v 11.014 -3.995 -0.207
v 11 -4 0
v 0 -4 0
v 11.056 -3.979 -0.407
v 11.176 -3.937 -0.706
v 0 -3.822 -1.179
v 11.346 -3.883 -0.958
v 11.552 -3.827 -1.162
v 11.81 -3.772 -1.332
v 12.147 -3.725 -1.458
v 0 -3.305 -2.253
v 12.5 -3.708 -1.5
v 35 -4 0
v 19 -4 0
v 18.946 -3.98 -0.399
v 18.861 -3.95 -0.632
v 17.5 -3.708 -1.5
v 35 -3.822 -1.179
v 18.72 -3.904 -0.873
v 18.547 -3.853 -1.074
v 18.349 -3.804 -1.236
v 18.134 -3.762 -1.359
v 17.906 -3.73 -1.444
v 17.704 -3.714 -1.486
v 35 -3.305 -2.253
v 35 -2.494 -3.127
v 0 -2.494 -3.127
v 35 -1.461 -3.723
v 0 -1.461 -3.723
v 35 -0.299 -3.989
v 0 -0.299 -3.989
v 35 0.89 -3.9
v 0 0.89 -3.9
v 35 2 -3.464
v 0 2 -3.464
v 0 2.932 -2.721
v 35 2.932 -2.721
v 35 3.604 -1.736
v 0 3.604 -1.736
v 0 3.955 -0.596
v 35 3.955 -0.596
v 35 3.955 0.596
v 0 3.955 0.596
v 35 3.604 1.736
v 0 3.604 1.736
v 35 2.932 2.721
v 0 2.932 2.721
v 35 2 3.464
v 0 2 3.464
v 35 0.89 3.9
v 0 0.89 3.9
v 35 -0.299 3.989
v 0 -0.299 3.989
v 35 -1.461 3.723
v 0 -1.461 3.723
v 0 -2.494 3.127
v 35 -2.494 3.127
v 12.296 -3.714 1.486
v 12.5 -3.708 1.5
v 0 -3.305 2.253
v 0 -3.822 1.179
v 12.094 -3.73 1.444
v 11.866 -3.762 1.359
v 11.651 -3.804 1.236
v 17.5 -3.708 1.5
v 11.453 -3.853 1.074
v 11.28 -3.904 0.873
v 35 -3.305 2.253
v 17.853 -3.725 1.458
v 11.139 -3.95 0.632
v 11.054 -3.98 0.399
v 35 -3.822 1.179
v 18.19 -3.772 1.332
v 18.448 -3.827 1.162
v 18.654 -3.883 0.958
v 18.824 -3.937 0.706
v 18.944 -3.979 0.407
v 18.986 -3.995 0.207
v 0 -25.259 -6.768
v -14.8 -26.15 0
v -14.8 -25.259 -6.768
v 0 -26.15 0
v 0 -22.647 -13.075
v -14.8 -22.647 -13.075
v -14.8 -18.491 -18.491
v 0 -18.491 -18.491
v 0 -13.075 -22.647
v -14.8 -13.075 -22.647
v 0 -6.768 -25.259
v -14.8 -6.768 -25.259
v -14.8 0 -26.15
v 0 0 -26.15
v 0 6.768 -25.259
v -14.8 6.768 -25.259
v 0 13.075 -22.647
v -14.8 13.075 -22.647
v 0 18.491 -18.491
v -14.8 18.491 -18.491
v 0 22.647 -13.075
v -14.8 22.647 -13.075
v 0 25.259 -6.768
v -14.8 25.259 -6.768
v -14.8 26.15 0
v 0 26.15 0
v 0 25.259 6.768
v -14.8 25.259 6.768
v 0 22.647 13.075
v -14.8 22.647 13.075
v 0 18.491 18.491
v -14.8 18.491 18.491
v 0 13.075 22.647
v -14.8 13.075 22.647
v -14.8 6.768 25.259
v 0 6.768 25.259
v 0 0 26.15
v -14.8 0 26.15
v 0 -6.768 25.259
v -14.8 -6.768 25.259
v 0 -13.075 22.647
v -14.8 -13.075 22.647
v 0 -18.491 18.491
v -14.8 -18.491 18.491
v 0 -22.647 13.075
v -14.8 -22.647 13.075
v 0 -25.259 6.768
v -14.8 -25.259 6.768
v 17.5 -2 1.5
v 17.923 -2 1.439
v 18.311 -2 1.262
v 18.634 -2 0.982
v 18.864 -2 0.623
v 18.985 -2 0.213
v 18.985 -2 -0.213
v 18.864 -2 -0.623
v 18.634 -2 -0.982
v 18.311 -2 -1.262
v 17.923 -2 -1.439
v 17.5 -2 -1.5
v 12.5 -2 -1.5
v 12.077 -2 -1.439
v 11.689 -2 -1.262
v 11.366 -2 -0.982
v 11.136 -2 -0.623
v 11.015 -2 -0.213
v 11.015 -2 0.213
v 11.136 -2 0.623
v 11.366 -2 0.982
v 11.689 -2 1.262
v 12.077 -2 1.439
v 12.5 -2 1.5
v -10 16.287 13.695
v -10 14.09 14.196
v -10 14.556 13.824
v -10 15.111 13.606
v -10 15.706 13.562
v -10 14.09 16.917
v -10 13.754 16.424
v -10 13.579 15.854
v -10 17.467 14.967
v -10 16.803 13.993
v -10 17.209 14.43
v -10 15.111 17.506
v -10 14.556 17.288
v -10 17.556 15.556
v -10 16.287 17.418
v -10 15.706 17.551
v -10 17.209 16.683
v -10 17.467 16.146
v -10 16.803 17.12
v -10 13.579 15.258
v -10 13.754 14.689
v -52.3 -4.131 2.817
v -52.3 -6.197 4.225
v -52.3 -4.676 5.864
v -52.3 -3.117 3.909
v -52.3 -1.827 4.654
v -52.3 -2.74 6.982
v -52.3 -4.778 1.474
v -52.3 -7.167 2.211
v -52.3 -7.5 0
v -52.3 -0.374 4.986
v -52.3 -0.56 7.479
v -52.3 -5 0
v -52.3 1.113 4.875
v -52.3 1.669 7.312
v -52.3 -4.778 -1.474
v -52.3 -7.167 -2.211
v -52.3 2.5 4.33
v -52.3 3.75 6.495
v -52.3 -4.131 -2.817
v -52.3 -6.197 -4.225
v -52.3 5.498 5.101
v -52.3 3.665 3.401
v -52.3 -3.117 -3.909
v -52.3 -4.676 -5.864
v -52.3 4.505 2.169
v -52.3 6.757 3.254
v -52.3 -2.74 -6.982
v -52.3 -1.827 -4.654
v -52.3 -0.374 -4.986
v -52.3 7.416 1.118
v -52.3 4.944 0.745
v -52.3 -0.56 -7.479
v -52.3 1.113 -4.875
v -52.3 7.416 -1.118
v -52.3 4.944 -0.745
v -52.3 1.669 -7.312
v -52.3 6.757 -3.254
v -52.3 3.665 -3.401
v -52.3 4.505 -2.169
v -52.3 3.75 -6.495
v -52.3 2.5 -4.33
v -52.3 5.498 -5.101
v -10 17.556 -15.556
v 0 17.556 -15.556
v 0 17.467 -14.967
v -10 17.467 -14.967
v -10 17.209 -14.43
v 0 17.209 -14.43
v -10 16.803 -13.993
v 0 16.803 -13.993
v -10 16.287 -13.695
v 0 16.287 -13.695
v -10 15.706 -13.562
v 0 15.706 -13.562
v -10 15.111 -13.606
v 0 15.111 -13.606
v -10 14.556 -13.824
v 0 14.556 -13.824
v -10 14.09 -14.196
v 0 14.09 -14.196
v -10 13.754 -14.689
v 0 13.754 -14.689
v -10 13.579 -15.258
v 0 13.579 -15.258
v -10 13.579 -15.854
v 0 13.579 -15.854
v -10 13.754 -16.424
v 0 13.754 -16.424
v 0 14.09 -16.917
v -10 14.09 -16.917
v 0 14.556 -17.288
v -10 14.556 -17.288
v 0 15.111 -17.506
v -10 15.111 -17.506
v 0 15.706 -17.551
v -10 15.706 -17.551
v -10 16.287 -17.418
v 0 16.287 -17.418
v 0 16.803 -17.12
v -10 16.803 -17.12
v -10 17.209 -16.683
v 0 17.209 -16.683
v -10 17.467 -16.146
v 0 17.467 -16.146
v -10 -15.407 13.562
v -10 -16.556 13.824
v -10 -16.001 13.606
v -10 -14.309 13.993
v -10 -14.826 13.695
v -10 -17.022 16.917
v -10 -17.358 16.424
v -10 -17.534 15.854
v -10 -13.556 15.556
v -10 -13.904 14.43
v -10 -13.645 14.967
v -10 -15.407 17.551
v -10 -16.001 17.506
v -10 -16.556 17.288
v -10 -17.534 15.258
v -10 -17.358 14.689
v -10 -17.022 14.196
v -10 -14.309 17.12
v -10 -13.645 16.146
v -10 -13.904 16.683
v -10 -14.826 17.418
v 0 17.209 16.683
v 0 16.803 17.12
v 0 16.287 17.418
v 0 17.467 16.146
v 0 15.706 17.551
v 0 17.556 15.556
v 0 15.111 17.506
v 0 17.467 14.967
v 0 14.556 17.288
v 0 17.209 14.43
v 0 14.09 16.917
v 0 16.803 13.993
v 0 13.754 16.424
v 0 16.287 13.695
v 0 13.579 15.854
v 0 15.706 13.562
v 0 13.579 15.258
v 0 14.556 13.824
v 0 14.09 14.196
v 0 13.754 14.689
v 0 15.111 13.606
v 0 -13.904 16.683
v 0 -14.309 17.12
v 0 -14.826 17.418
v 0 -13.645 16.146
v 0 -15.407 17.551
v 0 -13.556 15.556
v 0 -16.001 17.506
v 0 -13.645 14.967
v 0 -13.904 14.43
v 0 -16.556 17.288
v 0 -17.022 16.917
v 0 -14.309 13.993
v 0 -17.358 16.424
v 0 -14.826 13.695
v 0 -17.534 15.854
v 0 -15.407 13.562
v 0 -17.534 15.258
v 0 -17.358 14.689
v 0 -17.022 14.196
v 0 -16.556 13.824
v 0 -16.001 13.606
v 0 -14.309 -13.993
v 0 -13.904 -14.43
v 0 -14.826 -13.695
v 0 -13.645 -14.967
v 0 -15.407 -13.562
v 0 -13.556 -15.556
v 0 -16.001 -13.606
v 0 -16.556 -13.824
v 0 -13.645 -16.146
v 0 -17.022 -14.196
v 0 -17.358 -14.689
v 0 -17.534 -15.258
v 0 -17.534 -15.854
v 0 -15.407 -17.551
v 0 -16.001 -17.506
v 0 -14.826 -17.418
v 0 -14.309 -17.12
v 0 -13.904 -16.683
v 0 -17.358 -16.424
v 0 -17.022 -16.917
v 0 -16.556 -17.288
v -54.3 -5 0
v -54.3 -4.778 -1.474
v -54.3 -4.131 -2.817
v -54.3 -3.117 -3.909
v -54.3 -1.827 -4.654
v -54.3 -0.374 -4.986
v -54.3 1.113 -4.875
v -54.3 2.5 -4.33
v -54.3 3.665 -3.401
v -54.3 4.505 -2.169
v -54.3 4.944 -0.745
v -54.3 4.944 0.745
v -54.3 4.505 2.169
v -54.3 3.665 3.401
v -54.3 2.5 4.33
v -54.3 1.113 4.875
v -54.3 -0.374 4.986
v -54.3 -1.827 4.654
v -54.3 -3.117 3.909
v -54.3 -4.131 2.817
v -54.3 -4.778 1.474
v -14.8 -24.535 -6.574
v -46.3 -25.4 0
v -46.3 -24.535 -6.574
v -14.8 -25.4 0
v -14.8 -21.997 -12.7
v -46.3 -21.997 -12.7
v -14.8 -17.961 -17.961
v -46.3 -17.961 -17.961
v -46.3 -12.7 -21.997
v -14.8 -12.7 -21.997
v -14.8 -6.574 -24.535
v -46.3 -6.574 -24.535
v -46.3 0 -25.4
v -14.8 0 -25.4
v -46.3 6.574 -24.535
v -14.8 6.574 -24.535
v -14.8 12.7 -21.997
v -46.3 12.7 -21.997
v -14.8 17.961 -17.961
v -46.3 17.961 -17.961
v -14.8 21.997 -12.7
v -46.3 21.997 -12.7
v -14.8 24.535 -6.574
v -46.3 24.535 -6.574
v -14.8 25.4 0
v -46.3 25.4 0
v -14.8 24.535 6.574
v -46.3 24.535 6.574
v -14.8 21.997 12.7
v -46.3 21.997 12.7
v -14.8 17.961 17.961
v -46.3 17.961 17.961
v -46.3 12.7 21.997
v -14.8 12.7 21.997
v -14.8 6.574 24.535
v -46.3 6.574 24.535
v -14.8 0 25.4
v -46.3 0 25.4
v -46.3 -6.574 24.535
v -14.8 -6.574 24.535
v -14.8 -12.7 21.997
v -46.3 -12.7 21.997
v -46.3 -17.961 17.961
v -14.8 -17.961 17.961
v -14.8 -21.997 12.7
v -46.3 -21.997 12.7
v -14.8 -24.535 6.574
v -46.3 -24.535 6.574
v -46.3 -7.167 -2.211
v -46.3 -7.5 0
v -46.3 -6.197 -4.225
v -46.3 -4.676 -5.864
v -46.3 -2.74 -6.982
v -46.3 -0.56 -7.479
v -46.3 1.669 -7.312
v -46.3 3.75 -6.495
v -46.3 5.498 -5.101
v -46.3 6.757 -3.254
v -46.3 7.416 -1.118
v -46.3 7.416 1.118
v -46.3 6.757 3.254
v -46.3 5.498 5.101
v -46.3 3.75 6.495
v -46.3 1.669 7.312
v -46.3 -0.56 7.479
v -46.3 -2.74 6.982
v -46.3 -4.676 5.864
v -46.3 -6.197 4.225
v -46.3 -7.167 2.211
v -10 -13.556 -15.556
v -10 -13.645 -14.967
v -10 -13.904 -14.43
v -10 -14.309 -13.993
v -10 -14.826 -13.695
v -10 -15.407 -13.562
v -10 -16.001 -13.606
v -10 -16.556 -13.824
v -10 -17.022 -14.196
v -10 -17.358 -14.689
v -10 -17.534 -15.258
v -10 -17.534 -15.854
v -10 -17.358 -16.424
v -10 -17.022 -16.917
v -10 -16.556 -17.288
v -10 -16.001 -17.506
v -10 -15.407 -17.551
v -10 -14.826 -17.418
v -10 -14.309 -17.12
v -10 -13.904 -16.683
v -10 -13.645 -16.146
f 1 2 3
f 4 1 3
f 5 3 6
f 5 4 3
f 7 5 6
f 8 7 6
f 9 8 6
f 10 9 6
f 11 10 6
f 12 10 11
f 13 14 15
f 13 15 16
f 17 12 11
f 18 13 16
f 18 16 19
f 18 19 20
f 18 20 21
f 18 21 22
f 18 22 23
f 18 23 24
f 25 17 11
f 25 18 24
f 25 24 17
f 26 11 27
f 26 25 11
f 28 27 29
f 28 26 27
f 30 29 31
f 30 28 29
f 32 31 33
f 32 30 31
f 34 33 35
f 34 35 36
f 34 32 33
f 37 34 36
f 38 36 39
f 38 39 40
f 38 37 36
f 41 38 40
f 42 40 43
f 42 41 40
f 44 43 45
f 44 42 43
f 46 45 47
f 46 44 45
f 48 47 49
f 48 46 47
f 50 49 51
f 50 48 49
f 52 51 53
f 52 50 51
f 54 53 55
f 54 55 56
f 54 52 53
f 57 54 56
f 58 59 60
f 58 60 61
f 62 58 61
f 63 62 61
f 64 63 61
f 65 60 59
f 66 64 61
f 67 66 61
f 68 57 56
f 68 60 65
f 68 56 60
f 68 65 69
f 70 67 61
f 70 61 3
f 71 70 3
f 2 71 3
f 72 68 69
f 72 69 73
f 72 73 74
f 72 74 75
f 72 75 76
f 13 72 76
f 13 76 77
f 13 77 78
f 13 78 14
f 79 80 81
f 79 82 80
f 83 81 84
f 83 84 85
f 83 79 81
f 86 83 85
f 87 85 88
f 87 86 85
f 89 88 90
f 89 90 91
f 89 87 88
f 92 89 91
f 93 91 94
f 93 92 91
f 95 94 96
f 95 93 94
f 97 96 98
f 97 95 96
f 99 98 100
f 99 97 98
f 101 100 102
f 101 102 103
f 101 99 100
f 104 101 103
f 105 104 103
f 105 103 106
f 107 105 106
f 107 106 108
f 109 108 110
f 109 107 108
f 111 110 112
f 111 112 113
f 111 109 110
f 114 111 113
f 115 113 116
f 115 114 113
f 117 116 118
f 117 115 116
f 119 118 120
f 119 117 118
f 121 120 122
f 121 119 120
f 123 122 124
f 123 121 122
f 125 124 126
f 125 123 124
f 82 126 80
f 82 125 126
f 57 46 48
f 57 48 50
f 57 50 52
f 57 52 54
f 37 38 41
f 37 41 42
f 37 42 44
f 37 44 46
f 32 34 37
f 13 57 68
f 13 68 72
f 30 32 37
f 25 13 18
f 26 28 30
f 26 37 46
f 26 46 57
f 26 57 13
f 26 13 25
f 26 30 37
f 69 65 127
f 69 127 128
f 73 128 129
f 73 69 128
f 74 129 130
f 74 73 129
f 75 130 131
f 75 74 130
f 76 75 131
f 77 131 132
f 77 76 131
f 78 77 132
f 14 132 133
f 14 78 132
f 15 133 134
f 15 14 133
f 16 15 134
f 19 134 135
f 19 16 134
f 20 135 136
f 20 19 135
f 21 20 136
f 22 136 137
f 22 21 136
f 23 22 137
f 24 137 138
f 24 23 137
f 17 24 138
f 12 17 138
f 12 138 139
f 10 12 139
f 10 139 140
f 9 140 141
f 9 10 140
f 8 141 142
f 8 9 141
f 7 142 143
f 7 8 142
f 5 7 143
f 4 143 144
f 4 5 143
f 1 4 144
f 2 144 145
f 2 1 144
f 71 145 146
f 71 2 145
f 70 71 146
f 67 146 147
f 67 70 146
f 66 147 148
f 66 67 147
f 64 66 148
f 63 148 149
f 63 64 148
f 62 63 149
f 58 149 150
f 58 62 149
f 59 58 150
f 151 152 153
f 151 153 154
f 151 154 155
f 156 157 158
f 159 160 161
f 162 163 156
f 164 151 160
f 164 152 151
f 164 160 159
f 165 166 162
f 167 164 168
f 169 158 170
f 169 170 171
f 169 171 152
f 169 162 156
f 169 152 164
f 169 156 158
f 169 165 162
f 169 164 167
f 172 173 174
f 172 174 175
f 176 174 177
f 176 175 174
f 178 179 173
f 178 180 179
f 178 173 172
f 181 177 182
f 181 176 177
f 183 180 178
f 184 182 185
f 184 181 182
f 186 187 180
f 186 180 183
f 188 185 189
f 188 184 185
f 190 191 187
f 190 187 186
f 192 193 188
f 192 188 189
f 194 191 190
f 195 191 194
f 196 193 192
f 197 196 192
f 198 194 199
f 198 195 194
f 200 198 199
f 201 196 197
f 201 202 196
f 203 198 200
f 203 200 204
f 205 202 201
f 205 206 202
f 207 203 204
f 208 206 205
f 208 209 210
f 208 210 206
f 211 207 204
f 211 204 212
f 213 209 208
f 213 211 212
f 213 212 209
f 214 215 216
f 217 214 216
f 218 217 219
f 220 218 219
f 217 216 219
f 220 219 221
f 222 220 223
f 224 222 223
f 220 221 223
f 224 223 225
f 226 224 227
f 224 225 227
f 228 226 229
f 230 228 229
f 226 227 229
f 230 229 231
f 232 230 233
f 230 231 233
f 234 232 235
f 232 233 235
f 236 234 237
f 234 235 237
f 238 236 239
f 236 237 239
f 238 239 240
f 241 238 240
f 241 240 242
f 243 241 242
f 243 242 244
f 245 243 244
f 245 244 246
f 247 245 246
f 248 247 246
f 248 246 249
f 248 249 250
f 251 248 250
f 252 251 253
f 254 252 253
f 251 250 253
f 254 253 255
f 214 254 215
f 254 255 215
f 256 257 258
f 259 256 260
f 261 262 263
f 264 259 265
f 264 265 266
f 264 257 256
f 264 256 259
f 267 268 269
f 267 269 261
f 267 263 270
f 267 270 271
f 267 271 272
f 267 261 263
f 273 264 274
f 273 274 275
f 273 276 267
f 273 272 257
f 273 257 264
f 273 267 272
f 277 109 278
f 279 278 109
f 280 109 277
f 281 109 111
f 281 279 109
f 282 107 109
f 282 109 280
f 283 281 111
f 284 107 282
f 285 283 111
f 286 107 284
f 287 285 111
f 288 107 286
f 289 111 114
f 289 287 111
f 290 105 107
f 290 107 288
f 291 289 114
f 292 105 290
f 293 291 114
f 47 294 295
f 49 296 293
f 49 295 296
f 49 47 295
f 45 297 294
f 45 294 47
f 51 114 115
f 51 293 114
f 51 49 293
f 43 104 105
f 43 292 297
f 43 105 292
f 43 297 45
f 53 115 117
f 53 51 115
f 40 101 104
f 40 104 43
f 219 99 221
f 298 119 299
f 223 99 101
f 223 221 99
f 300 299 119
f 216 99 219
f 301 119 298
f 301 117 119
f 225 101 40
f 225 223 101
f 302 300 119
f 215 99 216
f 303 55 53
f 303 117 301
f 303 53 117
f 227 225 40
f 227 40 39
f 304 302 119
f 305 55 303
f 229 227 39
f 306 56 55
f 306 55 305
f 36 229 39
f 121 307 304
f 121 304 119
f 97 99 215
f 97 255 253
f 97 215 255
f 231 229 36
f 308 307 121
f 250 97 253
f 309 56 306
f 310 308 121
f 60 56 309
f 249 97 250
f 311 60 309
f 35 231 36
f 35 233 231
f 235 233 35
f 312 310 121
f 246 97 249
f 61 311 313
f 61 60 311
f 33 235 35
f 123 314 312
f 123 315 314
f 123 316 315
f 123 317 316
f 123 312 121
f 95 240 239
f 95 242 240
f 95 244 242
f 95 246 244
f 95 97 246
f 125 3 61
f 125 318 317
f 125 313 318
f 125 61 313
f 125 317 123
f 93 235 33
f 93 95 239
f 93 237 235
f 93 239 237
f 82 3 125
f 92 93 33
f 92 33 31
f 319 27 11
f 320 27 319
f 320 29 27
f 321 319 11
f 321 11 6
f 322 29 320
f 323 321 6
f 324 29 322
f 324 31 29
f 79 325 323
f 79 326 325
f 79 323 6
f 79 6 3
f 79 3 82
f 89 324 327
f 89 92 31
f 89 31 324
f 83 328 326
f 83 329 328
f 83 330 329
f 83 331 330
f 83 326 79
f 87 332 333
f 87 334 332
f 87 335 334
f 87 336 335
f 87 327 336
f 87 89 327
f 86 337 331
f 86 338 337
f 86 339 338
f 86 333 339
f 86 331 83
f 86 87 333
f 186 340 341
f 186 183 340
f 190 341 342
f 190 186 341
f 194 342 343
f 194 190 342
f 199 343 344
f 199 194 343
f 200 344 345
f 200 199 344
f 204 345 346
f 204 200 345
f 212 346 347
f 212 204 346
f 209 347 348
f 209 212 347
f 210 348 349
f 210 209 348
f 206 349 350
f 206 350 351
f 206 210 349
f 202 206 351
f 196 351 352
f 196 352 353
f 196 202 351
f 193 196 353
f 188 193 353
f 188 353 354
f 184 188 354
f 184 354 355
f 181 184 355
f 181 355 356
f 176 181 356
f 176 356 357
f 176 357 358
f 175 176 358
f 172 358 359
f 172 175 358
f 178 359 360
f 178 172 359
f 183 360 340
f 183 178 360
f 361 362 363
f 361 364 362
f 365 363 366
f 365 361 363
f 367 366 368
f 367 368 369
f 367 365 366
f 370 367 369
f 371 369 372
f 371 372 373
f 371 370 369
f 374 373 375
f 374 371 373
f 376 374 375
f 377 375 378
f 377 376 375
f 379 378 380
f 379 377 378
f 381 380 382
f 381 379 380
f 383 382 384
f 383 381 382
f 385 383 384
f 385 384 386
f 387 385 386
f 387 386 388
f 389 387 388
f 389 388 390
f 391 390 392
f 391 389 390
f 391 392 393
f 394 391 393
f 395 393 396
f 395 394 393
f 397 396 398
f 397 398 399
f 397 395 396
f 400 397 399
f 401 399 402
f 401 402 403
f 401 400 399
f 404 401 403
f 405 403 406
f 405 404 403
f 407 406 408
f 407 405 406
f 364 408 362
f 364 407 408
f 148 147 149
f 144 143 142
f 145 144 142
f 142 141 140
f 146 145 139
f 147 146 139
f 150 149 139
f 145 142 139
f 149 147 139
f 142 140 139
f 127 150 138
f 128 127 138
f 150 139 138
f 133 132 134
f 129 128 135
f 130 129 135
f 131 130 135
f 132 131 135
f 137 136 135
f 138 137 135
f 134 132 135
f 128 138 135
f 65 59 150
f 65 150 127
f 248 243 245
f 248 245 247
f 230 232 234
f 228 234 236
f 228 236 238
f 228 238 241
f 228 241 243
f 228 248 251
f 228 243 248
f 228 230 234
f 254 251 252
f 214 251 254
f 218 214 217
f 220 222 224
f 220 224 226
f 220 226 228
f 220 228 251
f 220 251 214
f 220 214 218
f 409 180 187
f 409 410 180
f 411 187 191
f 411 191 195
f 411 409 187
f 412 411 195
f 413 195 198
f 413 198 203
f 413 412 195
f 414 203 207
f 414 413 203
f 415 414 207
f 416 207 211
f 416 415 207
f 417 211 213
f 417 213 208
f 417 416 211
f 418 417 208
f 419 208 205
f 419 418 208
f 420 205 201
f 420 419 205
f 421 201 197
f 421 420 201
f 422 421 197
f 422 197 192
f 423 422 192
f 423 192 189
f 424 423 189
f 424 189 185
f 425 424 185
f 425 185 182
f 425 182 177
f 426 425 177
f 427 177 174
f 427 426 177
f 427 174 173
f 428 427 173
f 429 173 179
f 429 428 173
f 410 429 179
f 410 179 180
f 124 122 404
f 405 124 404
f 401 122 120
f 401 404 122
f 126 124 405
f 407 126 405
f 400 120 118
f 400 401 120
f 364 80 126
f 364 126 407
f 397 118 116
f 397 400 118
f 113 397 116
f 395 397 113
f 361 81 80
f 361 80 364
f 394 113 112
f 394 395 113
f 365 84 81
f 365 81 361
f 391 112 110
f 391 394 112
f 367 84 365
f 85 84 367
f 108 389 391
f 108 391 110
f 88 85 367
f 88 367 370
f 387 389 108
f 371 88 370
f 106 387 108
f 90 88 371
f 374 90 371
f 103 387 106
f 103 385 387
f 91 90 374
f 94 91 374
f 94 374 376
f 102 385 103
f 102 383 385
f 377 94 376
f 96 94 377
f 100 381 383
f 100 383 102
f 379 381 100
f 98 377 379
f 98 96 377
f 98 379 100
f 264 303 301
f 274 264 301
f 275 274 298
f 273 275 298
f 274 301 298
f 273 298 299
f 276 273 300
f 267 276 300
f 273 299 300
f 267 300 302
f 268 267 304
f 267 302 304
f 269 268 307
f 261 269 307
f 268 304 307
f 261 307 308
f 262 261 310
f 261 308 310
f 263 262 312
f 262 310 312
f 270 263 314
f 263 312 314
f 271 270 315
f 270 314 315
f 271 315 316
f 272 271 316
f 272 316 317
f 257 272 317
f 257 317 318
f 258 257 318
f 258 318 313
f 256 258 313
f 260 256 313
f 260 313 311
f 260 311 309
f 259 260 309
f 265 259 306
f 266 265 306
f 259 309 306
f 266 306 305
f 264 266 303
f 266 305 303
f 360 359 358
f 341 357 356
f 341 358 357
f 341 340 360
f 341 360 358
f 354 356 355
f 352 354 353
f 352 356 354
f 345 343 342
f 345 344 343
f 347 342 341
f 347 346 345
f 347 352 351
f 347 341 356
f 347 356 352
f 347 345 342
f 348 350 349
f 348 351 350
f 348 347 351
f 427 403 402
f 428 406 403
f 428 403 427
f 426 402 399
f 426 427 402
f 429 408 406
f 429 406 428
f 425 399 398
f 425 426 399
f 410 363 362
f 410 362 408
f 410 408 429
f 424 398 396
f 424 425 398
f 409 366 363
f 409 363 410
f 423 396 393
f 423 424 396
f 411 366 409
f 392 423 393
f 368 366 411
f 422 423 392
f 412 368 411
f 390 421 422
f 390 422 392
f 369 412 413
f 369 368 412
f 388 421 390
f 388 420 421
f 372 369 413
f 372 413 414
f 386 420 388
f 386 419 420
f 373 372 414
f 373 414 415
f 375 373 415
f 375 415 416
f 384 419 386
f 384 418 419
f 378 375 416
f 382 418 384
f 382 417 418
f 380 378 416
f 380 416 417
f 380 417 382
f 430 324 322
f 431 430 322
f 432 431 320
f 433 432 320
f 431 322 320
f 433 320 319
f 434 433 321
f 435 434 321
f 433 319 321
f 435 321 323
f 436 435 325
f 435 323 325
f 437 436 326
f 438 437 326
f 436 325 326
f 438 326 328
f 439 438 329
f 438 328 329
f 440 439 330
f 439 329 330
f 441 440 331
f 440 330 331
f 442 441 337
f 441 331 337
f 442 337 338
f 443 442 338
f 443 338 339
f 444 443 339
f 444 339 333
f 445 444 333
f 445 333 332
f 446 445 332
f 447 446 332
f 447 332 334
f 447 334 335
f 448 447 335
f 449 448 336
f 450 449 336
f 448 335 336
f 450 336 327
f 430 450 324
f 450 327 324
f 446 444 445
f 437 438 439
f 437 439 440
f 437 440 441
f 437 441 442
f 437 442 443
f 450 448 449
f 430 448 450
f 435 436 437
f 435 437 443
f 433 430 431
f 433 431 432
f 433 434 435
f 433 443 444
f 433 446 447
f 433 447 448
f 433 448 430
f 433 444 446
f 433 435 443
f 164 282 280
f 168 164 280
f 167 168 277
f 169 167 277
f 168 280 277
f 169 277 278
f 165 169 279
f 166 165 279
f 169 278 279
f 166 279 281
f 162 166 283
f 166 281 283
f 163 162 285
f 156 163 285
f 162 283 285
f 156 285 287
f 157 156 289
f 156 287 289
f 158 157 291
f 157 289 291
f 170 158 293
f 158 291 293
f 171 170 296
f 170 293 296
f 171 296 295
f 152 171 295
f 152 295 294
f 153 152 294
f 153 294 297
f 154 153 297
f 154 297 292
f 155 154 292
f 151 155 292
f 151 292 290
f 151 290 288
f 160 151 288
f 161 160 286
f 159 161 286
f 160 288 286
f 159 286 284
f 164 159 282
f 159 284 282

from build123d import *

# Parameters (mm, degrees)
SKETCH3_R          = 2
CUT_EXTRUDE1_DEPTH = 10
CUT_EXTRUDE2_DEPTH = 2


with BuildPart() as part:
    # Sketch2 → Revolve1 (revolve)
    with BuildSketch(Plane.XY, mode=Mode.PRIVATE) as revolve1_sk:
        Polygon((-54.3, 0), (-54.3, 5), (-52.3, 5), (-52.3, 7.5), (-46.3, 7.5), (-46.3, 25.4), (-14.8, 25.4), (-14.8, 26.15), (0, 26.15), (0, 4), (35, 4), (35, 0), align=None)
    revolve(revolve1_sk.sketch.rotate(Axis((-163.925373134, 0, 0), (1, 0, 0)), 180), axis=Axis((-163.925373134, 0, 0), (1, 0, 0)))

    # Sketch3 → Cut-Extrude1 (cut)
    with BuildSketch(Plane(origin=(0, 0, 0), x_dir=(0, 0, -1), z_dir=(1, 0, 0))):
        with Locations(Location((-15.556349186, -15.556349186, 0), (0, 0, 90))):
            Circle(SKETCH3_R)
        with Locations(Location((-15.556349186, 15.556349186, 0), (0, 0, 90))):
            Circle(SKETCH3_R)
        with Locations(Location((15.556349186, 15.556349186, 0), (0, 0, 90))):
            Circle(SKETCH3_R)
        with Locations(Location((15.556349186, -15.556349186, 0), (0, 0, 90))):
            Circle(SKETCH3_R)
    extrude(amount=-CUT_EXTRUDE1_DEPTH, mode=Mode.SUBTRACT)

    # Sketch5 → Cut-Extrude2 (cut)
    with BuildSketch(Plane(origin=(0, -4, 0), x_dir=(-1, 0, 0), z_dir=(0, -1, 0))):
        with BuildLine():
            Line((-12.5, -1.5), (-17.5, -1.5))
            ThreePointArc((-17.5, -1.5), (-19, 0), (-17.5, 1.5))
            Line((-17.5, 1.5), (-12.5, 1.5))
            ThreePointArc((-12.5, 1.5), (-11, 0), (-12.5, -1.5))
        make_face()
    extrude(amount=-CUT_EXTRUDE2_DEPTH, mode=Mode.SUBTRACT)


solid = part.part
